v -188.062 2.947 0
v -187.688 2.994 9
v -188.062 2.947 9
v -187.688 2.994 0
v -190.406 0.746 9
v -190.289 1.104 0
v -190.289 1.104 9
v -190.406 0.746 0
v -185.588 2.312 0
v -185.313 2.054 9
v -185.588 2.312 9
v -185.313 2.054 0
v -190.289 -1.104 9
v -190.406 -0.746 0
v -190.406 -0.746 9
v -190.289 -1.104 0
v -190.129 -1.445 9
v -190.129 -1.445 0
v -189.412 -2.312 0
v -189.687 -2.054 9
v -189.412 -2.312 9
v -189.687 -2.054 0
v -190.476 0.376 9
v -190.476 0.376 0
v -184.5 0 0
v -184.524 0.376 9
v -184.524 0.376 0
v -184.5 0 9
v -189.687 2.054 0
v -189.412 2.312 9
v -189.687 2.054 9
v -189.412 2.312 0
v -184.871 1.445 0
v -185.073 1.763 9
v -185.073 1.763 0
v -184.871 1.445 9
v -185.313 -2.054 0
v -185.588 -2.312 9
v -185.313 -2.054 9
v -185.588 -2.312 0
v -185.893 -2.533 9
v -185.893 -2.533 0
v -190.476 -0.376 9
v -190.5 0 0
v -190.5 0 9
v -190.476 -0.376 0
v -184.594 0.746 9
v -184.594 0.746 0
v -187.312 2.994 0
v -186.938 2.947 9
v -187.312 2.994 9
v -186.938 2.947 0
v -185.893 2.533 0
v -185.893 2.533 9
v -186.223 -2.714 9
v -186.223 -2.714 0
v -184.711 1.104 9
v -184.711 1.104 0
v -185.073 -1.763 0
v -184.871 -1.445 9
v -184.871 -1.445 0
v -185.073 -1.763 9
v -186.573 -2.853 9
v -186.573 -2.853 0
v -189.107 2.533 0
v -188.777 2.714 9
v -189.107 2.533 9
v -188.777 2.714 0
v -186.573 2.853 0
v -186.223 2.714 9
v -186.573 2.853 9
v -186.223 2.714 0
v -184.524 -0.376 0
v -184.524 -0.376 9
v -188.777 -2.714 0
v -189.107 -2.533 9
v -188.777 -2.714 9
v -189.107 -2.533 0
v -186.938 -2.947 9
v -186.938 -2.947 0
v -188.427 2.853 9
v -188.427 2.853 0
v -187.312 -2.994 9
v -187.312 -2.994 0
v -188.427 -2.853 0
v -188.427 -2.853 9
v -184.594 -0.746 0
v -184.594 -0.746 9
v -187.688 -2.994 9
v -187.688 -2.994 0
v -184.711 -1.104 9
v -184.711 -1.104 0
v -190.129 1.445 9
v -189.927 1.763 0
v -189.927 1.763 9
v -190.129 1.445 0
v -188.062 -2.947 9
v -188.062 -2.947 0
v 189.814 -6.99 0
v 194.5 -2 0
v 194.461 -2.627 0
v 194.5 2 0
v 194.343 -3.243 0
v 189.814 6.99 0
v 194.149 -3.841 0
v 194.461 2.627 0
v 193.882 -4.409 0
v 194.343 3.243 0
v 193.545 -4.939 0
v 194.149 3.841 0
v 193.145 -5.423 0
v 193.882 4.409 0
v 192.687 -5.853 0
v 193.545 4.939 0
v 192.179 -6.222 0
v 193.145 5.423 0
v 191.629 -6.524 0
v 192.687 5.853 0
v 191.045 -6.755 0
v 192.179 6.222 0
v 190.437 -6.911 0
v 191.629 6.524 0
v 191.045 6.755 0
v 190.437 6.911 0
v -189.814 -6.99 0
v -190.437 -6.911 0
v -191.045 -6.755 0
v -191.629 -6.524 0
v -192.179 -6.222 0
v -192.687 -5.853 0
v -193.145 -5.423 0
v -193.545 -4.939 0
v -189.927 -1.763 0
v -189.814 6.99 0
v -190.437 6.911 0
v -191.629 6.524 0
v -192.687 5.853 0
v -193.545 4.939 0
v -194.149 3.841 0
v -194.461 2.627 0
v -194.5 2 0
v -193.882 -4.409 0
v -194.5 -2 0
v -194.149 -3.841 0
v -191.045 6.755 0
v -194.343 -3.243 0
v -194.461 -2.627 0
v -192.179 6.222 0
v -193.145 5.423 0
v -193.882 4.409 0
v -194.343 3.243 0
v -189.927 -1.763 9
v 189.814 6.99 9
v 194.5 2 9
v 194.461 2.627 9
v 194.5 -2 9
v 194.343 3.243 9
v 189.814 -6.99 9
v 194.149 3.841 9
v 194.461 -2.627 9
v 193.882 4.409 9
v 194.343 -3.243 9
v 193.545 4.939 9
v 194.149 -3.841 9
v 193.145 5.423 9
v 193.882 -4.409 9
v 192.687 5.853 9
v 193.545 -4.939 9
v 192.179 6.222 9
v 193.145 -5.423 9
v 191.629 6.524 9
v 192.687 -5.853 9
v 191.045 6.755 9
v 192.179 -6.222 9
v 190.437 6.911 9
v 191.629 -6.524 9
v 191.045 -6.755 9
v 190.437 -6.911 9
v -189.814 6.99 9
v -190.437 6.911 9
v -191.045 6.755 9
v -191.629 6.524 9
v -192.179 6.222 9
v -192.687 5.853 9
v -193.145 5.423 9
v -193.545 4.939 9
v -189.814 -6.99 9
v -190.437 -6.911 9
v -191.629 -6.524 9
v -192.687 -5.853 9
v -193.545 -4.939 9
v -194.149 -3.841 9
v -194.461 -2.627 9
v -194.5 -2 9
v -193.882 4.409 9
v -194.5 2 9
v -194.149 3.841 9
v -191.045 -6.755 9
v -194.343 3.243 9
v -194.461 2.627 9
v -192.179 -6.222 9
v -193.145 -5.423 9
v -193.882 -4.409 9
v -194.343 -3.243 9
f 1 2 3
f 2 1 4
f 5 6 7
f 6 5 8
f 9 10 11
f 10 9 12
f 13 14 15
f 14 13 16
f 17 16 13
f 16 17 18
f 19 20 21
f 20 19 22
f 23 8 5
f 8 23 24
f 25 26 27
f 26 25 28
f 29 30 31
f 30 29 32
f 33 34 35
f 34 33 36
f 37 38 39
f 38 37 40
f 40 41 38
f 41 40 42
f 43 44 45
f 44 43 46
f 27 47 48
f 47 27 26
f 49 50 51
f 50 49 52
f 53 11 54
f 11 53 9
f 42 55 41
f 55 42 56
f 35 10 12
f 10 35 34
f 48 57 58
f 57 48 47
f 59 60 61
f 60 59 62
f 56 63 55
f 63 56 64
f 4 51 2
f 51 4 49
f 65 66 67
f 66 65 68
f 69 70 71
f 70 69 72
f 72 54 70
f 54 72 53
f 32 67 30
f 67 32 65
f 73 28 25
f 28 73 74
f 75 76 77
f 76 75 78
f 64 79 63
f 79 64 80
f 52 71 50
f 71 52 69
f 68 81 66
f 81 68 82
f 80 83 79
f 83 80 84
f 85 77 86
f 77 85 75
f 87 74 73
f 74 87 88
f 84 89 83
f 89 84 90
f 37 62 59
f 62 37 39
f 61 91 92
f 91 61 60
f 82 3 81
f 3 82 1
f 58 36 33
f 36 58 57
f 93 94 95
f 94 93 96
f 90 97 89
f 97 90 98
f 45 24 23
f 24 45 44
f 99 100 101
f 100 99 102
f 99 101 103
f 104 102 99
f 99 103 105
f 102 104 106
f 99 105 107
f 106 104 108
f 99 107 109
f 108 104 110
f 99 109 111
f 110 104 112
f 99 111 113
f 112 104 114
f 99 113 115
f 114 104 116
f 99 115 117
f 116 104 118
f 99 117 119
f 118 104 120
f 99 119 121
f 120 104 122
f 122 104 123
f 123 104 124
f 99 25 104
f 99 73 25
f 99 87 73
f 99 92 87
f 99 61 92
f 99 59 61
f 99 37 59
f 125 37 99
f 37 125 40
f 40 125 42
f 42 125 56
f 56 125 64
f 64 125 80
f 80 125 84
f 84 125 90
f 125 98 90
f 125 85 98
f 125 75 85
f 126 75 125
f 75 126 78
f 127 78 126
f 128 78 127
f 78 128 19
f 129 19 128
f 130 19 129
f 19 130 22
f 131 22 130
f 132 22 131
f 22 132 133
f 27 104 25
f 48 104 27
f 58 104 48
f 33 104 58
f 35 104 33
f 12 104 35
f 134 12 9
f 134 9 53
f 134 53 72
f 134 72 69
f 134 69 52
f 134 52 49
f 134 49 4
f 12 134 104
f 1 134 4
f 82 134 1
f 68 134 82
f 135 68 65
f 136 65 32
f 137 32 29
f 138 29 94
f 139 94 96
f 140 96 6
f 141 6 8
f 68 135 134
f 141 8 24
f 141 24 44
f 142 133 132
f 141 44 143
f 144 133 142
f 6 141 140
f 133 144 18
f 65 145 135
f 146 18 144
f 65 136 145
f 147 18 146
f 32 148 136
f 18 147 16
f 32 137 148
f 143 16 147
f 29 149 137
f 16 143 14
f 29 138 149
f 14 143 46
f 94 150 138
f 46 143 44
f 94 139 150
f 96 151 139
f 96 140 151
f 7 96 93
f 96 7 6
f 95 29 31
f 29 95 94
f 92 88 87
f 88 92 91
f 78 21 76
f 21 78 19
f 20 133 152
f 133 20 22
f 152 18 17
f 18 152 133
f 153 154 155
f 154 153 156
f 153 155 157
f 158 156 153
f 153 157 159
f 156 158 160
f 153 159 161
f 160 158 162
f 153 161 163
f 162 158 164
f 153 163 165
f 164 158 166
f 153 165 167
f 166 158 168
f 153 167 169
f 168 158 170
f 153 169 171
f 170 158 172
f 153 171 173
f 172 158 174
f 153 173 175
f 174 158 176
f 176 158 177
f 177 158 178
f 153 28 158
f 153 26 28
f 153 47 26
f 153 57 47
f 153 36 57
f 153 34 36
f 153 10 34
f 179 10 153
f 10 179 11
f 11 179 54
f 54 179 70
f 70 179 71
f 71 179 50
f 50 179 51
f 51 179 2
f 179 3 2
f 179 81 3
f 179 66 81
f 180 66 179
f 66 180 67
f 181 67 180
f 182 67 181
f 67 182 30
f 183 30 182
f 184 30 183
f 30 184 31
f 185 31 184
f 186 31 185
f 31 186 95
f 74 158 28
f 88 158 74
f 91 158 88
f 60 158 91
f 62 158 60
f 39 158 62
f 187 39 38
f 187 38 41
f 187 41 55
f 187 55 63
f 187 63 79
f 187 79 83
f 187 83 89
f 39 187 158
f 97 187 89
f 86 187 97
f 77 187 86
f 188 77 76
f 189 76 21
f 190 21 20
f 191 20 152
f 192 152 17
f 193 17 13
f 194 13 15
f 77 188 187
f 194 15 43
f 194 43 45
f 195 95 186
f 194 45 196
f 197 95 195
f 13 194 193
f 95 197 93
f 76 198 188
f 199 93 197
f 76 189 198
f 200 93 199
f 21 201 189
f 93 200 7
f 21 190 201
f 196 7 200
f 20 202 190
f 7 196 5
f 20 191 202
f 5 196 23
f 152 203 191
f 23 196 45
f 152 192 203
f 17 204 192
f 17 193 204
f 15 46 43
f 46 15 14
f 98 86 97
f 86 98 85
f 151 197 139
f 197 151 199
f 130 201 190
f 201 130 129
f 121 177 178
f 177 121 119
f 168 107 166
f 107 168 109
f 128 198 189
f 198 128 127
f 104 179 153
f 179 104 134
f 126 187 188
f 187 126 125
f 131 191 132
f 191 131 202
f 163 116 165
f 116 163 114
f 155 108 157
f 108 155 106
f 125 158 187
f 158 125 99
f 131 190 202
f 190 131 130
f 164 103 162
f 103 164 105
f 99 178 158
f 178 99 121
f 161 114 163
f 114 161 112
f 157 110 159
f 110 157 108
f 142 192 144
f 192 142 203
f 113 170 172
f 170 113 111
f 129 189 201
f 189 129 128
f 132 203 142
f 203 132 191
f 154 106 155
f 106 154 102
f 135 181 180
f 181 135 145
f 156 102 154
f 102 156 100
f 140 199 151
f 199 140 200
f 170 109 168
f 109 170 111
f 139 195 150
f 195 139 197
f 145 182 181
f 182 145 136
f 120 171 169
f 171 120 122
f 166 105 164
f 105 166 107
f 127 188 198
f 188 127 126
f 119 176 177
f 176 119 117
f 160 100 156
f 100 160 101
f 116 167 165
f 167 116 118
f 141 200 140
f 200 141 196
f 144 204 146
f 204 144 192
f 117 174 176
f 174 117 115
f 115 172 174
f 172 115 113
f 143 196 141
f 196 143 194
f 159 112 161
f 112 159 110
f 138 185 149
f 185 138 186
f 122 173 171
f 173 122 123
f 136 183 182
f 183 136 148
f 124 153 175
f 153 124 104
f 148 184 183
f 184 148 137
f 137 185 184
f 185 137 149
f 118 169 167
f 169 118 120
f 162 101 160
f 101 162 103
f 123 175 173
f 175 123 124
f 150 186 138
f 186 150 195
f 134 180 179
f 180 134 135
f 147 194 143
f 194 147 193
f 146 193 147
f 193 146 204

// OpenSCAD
$fn = 50;


difference() {
	union() {
		hull() {
			translate(v = [-189.5000000000, 2.0000000000, 0]) {
				cylinder(h = 9, r = 5);
			}
			translate(v = [189.5000000000, 2.0000000000, 0]) {
				cylinder(h = 9, r = 5);
			}
			translate(v = [-189.5000000000, -2.0000000000, 0]) {
				cylinder(h = 9, r = 5);
			}
			translate(v = [189.5000000000, -2.0000000000, 0]) {
				cylinder(h = 9, r = 5);
			}
		}
	}
	union() {
		translate(v = [-187.5000000000, 0.0000000000, 0]) {
			cylinder(h = 9, r = 3.0000000000);
		}
		translate(v = [-187.5000000000, 0.0000000000, 0]) {
			cylinder(h = 9, r = 1.5000000000);
		}
		translate(v = [-187.5000000000, 0.0000000000, 0]) {
			cylinder(h = 9, r = 1.5000000000);
		}
		translate(v = [-187.5000000000, 0.0000000000, 0]) {
			cylinder(h = 9, r = 1.5000000000);
		}
	}
}
